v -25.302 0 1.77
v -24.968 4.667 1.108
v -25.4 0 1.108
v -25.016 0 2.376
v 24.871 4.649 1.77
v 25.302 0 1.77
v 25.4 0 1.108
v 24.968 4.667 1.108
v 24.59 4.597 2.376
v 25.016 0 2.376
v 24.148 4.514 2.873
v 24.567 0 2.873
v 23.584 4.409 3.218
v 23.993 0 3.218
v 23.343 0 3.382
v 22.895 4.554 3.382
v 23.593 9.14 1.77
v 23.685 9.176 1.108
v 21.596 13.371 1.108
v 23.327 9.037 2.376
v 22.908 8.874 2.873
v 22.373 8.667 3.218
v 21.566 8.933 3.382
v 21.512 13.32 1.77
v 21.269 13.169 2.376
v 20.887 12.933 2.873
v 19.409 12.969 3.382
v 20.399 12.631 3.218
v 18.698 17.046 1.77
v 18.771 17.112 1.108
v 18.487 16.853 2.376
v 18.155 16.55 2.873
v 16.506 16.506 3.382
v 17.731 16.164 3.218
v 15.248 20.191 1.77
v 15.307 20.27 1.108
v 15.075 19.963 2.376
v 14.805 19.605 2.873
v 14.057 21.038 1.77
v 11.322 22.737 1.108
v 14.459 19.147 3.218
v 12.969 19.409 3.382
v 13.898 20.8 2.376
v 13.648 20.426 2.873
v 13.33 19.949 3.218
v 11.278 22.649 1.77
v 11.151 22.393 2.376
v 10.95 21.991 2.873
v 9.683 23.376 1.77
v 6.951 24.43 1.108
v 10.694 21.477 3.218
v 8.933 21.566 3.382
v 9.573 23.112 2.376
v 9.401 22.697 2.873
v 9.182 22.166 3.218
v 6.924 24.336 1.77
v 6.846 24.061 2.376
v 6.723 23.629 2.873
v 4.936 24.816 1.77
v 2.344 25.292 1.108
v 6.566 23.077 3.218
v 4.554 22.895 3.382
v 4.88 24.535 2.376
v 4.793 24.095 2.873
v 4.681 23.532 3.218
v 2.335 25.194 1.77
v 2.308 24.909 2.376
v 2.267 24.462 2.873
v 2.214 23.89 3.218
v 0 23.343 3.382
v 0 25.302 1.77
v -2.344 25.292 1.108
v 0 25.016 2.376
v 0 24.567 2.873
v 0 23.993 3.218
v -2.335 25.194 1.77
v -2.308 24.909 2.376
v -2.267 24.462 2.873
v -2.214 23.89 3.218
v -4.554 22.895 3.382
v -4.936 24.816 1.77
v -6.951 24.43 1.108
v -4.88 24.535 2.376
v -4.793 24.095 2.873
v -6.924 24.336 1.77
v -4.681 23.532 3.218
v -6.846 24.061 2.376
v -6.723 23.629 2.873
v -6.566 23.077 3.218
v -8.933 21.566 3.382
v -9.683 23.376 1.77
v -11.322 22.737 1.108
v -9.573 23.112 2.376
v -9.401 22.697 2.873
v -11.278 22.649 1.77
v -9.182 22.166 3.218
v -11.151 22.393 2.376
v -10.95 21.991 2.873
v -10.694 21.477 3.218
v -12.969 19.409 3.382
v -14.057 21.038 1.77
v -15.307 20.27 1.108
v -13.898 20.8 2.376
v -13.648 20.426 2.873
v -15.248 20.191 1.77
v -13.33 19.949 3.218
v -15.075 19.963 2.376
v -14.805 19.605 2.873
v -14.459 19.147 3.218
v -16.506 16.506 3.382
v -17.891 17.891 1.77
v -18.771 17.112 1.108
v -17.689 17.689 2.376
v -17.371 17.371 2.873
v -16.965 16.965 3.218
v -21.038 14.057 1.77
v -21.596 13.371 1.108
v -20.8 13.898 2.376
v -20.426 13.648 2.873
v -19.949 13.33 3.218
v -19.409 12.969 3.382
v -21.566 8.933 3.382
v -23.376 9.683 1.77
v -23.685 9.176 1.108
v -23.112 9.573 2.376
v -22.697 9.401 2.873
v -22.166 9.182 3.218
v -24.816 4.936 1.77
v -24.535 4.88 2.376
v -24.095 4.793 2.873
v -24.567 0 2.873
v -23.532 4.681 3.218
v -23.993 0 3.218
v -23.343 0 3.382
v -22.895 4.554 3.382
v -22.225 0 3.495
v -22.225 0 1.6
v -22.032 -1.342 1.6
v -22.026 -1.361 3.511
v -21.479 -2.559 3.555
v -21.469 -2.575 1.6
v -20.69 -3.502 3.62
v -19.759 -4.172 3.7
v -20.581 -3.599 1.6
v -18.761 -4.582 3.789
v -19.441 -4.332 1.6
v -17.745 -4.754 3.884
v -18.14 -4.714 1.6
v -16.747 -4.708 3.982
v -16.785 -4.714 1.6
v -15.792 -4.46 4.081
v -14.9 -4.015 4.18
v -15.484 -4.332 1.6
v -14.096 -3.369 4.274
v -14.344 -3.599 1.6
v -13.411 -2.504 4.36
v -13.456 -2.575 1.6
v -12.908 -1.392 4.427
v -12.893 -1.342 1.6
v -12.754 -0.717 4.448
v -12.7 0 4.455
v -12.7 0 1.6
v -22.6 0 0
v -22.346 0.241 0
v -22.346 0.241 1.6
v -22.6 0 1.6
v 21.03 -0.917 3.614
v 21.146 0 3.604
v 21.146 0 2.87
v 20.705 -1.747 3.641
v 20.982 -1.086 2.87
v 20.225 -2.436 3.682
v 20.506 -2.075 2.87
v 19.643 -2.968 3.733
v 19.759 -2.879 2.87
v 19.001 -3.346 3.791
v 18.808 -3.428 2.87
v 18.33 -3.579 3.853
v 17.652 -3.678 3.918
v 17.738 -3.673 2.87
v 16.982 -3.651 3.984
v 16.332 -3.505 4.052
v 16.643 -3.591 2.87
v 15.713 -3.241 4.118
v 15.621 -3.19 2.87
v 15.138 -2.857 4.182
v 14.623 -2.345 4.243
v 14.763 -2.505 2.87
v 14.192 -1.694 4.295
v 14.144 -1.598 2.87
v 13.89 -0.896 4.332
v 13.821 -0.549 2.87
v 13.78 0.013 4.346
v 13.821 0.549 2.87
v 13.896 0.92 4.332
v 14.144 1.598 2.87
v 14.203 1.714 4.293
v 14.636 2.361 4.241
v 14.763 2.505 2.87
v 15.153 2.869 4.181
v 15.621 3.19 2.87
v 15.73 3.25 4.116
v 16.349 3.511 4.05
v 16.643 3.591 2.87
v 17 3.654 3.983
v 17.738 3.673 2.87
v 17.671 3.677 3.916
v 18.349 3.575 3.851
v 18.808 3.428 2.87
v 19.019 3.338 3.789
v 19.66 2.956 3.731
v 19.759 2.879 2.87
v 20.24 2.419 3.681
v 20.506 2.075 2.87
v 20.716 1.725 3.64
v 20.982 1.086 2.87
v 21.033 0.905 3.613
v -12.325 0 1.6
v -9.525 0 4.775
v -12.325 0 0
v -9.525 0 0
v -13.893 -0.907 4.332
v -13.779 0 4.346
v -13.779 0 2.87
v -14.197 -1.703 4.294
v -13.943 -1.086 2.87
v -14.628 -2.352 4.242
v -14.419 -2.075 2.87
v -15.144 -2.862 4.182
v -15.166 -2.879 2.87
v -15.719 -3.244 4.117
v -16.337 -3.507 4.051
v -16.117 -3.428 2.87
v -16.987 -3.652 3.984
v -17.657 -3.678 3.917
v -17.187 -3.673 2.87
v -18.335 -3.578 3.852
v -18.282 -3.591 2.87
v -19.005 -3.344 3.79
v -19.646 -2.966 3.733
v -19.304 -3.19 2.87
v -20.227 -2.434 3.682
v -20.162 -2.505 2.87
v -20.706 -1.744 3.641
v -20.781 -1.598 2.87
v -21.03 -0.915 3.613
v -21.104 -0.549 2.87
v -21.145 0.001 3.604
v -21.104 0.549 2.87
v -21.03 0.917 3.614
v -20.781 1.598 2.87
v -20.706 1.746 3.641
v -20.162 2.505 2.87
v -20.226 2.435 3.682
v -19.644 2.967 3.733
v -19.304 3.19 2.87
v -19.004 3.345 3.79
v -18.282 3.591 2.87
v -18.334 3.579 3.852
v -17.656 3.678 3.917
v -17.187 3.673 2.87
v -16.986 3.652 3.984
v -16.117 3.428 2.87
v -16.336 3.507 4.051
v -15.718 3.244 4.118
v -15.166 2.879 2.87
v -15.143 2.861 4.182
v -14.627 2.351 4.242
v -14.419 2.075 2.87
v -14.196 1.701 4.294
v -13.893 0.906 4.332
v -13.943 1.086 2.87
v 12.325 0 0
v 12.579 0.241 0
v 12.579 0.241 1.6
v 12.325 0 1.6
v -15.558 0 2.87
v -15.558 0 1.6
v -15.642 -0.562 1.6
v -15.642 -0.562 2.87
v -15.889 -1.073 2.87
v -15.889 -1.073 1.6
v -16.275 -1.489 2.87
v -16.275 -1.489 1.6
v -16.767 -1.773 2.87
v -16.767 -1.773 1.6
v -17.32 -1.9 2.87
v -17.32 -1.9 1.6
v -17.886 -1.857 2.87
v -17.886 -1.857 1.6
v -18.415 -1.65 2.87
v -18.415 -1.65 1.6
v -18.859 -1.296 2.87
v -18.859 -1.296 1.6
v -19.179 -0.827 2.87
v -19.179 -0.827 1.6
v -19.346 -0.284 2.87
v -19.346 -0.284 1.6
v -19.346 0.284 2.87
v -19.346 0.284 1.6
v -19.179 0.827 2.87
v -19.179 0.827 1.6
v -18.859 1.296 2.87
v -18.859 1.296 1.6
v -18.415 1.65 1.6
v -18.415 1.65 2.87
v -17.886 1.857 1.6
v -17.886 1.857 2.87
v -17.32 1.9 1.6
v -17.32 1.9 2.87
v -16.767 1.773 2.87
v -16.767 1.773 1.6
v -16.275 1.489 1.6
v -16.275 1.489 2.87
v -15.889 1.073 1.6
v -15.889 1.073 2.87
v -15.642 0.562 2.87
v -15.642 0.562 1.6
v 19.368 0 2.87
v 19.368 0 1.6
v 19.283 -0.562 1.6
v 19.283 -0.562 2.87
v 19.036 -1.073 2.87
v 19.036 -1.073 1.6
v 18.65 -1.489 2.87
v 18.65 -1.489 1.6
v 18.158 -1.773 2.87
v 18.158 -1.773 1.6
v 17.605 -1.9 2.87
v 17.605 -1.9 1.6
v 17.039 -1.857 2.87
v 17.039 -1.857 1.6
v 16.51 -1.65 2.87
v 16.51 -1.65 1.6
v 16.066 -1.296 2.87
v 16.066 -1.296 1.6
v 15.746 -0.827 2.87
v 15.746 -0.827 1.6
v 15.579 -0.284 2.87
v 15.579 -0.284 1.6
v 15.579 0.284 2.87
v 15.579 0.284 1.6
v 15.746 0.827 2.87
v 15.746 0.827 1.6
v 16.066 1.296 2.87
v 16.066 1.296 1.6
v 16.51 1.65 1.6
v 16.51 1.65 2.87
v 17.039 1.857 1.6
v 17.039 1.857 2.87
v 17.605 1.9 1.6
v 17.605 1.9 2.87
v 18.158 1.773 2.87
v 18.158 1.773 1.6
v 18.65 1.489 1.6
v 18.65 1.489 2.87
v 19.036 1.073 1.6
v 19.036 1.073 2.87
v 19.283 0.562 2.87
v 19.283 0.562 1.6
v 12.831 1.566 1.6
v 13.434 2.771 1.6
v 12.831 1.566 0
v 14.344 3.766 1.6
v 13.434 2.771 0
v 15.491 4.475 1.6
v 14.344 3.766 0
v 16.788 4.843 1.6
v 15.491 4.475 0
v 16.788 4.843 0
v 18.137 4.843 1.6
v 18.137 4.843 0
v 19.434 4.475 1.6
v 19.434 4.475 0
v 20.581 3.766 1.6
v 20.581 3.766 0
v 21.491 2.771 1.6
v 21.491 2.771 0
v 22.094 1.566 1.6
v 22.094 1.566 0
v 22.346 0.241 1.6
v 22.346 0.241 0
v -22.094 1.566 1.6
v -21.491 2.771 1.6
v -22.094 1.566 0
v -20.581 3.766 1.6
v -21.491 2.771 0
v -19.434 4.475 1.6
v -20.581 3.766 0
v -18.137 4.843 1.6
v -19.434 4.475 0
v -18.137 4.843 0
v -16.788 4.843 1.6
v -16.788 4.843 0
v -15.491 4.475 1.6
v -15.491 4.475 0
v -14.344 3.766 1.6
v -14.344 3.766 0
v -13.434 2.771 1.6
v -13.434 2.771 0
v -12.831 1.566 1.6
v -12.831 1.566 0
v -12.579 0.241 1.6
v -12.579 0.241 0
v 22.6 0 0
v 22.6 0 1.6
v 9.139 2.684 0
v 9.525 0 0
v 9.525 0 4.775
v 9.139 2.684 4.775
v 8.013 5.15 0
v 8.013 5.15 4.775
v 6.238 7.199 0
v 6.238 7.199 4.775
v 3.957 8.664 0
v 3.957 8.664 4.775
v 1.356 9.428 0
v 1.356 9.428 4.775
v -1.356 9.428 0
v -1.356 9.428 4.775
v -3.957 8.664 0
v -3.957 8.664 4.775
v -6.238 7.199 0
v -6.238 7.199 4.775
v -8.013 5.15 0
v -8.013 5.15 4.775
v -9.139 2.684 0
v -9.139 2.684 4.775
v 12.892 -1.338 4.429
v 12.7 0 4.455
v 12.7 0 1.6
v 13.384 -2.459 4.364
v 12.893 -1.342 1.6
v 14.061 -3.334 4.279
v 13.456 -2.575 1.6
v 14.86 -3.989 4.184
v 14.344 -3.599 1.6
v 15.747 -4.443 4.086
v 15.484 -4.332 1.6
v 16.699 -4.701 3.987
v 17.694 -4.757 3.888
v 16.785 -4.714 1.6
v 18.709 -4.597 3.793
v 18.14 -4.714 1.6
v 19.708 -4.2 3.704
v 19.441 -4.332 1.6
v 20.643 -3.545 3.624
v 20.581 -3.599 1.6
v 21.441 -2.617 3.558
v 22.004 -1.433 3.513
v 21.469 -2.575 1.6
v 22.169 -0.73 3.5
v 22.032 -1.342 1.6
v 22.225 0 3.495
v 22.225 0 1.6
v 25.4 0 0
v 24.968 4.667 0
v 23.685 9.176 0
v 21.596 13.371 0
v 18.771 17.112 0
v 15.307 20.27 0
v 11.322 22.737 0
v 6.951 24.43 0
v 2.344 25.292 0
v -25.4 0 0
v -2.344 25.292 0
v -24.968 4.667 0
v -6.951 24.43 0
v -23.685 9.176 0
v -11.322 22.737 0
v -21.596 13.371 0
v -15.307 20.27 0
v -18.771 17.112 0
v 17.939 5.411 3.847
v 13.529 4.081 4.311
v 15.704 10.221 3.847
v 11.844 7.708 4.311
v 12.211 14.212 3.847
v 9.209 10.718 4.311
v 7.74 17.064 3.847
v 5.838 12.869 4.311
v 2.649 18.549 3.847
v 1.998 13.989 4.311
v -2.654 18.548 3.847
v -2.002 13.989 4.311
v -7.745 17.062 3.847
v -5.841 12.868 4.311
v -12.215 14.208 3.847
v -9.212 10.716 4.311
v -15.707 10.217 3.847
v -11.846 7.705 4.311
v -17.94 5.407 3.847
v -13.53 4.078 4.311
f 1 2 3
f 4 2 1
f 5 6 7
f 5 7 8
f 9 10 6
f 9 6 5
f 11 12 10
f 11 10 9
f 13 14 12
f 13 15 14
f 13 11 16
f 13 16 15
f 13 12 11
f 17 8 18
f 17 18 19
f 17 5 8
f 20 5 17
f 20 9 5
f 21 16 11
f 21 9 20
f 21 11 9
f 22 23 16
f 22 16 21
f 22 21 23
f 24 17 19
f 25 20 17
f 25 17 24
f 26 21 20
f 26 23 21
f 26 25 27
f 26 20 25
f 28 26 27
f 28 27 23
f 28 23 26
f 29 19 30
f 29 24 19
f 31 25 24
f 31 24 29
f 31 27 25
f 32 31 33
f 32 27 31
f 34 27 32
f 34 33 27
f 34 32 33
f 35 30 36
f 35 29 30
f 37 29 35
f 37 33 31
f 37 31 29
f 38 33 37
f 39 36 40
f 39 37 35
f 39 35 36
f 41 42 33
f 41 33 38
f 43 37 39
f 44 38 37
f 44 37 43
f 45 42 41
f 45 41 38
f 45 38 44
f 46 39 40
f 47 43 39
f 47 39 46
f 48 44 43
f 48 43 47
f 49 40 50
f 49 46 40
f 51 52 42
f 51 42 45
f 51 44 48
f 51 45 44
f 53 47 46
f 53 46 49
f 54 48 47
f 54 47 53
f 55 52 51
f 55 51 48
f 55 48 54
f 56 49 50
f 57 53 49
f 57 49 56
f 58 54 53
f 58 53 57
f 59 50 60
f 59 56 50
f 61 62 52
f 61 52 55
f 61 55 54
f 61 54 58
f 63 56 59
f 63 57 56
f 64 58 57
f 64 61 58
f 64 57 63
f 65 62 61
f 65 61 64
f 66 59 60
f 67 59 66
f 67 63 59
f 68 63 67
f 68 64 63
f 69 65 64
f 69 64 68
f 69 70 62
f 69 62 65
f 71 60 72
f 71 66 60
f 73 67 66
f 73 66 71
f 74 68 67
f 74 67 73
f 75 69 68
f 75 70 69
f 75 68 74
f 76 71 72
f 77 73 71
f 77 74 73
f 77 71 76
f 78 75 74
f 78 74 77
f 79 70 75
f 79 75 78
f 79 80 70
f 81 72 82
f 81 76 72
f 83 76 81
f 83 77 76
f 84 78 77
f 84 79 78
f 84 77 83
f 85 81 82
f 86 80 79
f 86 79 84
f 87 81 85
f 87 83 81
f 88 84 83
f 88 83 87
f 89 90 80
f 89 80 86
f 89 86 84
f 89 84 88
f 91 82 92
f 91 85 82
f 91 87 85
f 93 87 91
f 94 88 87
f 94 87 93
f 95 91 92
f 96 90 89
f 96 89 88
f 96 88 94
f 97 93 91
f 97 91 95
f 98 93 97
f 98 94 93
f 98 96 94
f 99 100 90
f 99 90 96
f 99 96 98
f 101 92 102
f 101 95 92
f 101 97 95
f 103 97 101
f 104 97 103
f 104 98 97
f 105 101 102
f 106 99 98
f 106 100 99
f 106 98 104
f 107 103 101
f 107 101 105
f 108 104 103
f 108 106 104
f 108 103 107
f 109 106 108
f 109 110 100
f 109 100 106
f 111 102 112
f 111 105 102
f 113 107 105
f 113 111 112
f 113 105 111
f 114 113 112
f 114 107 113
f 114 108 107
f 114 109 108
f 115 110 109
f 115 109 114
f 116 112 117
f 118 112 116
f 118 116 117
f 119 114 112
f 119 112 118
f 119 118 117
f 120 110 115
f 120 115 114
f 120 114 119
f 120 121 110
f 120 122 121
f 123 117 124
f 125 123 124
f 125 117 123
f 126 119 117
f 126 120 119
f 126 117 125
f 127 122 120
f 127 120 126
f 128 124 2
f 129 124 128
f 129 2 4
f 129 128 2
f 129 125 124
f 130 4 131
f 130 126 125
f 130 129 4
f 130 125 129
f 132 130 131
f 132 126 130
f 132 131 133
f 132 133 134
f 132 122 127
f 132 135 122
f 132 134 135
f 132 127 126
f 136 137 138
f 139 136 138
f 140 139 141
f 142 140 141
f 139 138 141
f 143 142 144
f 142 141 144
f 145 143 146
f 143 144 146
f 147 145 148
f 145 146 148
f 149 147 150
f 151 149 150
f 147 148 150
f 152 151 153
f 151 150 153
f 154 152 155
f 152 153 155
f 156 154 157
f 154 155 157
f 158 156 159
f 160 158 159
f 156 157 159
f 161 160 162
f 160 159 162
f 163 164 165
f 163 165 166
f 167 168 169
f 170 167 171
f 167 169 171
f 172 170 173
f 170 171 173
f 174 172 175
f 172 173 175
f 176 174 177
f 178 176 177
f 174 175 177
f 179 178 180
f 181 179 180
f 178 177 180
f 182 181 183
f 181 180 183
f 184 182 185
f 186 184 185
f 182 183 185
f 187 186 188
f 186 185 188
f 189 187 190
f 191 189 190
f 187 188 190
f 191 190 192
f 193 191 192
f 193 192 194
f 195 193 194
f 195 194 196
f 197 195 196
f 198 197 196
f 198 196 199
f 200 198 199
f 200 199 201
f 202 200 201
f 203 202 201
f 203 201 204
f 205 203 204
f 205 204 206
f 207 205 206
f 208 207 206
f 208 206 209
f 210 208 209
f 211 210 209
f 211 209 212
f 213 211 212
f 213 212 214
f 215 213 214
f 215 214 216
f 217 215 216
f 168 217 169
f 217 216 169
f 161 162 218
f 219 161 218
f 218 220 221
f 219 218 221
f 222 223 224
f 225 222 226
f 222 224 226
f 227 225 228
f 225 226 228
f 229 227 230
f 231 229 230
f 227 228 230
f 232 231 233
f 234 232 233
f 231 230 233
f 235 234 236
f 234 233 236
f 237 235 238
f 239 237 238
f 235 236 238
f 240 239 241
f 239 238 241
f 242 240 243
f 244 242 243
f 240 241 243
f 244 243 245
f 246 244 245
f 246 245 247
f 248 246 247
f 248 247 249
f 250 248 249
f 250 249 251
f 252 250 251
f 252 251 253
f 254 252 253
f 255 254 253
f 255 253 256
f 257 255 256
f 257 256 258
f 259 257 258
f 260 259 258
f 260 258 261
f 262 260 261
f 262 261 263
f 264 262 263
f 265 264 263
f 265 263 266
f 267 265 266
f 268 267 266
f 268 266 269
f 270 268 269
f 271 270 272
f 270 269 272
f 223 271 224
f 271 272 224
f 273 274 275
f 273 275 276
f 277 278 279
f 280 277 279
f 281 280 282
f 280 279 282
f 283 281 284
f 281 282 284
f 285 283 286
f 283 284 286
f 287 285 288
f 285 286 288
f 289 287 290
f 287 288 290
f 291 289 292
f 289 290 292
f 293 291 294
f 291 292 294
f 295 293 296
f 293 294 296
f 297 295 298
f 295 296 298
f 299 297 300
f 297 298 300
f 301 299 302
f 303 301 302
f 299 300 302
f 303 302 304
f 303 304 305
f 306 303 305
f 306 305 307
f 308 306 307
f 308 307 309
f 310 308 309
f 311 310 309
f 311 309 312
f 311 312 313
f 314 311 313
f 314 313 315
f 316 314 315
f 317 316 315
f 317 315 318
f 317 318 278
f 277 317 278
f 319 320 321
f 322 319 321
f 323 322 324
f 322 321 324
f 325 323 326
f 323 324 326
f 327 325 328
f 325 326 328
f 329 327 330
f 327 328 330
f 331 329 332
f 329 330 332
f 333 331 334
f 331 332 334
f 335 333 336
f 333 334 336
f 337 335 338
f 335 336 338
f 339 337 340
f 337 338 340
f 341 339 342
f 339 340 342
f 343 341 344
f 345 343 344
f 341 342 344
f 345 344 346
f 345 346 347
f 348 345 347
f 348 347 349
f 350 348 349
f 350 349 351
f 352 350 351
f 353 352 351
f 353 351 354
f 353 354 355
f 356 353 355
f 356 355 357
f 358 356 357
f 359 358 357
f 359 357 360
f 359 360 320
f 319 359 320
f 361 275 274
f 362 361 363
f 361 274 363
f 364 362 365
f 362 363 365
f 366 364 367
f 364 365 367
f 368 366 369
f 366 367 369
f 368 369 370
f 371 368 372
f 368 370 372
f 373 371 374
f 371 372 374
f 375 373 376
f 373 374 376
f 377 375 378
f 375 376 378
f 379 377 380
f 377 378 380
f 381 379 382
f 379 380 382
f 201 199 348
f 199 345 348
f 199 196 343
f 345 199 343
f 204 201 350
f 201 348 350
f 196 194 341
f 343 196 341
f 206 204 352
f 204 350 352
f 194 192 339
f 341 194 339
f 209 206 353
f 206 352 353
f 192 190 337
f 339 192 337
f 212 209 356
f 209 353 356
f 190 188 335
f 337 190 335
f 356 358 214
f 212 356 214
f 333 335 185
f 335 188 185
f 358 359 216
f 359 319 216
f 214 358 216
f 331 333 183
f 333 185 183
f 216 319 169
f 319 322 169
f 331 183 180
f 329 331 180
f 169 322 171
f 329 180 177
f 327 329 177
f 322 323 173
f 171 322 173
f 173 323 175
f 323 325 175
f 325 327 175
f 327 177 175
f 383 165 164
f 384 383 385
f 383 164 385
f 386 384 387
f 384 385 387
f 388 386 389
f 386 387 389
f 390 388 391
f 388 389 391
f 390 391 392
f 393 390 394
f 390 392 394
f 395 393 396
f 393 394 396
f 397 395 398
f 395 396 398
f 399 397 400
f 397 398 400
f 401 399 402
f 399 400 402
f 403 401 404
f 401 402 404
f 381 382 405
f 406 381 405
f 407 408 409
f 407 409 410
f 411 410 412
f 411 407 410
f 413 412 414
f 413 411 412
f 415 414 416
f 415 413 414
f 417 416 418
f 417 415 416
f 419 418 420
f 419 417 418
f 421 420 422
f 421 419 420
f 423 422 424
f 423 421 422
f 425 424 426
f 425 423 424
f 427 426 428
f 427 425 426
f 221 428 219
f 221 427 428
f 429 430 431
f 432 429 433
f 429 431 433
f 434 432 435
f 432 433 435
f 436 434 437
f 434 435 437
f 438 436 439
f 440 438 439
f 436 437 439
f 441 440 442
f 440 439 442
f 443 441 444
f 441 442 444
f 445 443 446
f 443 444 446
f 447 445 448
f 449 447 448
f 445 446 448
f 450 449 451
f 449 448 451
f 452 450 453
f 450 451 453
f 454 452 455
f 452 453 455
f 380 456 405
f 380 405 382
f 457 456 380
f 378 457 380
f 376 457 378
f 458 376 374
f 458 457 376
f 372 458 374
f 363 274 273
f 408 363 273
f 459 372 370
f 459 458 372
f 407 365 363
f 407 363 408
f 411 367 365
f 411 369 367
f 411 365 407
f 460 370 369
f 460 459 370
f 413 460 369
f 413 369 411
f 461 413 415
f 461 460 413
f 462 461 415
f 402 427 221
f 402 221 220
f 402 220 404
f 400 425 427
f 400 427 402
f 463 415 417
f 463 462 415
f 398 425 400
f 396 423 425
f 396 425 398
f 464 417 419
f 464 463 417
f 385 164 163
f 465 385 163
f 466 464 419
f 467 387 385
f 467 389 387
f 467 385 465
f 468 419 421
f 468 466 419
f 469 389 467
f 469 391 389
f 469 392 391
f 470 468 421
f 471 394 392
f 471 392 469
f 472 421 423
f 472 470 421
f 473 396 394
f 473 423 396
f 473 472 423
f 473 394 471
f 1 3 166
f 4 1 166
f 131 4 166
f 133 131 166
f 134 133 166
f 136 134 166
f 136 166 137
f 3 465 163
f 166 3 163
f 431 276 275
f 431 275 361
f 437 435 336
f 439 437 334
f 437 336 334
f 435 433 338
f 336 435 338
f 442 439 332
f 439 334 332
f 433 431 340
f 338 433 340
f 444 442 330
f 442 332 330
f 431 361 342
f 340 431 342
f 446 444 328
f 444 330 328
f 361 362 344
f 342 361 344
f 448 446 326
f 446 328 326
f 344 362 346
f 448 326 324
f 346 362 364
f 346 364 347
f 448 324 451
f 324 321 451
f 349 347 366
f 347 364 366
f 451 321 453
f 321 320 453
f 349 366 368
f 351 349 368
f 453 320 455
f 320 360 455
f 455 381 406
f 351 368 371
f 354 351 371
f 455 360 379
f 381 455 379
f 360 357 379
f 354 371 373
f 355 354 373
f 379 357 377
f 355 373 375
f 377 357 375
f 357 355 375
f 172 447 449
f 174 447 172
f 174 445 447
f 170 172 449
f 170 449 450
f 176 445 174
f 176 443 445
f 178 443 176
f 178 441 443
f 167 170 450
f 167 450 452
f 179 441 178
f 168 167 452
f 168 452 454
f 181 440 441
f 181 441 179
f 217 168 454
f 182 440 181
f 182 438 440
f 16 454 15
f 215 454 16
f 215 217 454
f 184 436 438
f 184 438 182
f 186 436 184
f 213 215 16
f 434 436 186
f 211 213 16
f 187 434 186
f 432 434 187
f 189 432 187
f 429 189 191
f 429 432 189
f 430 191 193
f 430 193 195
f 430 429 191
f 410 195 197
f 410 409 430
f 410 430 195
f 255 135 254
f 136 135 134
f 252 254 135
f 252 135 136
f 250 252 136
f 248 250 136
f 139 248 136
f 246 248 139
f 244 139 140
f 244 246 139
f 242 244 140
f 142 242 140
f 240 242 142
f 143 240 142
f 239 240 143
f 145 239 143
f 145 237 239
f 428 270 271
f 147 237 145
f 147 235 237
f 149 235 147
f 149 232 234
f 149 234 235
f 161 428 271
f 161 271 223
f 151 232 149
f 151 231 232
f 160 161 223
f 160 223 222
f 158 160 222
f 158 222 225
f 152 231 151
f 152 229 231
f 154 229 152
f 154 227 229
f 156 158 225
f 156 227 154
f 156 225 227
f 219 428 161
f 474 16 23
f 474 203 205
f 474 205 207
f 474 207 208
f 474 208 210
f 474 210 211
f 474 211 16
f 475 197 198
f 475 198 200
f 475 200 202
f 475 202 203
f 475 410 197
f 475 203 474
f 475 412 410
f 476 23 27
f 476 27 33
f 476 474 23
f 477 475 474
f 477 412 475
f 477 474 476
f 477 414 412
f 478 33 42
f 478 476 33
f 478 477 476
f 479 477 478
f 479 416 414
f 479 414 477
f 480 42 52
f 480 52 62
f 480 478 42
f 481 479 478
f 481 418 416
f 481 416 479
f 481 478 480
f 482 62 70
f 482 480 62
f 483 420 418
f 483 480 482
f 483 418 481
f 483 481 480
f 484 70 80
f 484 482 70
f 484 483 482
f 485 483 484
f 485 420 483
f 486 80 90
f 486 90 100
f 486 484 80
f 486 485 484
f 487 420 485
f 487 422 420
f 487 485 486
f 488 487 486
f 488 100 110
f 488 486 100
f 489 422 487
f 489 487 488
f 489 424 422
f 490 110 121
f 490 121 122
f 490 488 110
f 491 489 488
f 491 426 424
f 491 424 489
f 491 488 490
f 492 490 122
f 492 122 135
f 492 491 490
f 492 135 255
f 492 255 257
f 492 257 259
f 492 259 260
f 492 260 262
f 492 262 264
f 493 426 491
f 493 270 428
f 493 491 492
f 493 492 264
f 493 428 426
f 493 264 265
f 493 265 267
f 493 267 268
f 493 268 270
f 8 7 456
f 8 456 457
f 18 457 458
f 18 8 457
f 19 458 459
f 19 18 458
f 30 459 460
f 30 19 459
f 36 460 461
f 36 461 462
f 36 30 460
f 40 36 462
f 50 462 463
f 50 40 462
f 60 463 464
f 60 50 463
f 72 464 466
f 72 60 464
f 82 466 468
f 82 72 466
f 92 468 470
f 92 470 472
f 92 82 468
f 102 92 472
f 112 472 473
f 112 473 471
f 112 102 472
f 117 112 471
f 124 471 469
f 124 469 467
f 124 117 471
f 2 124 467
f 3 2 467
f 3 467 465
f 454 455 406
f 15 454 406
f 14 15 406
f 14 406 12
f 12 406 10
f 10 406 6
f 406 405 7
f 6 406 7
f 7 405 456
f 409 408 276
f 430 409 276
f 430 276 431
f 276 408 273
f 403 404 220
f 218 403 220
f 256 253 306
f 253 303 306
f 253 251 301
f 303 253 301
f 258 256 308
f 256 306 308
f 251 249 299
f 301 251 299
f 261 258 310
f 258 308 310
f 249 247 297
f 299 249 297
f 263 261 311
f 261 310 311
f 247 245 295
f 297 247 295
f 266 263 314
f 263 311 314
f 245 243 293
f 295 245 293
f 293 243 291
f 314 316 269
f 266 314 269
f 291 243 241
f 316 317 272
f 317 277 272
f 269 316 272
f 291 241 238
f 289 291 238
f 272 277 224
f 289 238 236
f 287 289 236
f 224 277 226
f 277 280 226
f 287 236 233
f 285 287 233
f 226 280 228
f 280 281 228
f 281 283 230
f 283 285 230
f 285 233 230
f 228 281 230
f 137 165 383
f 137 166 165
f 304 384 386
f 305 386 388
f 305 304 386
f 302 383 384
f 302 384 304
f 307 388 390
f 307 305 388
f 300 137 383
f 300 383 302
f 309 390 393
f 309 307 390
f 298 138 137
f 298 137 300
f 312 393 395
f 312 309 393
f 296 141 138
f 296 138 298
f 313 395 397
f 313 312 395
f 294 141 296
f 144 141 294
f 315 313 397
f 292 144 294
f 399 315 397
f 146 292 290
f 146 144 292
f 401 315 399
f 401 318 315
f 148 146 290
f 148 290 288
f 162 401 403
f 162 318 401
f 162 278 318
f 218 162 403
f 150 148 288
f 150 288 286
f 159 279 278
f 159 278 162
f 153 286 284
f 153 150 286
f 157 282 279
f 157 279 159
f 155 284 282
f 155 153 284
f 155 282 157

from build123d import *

# Parameters (mm, degrees)
F3_DEPTH     = 4.7762
F4_R         = 4.8895
F5_DEPTH     = 1.6002
F6_R         = 1.905
F7_DEPTH     = 3.1760001
F9_R         = 3.683
F10_DEPTH    = 1.9060001
F11_T1_DEPTH = 2.2381504403


# Not quite as in the source:
# - a fillet or chamfer that OpenCascade refuses, or shapes differently, is made with other operations: its cross-section is extruded or revolved along the edge and cut away or added


with BuildPart() as f1:
    # F0 (on Front) → F1 (revolve)
    with BuildSketch(Plane.XZ):
        with BuildLine():
            Line((9.525, 4.7752), (9.525, 0))
            Line((9.525, 0), (25.4, 0))
            Line((25.4, 0), (25.4, 1.10784454))
            ThreePointArc((25.4, 1.10784454), (24.8095678029, 2.6410913648), (23.343266994, 3.382318687))
            Line((23.343266994, 3.382318687), (9.525, 4.7752))
        make_face()
    revolve(axis=Axis((0, 0, 2.1961550228), (0, 0, 1)))

    # F2 (on face) → F3 (cut, through all)
    with BuildSketch(Plane(origin=(0, 0, 0), x_dir=(1, 0, 0), z_dir=(0, 0, -1))):
        with BuildLine():
            Line((-25.4, 25.4), (-25.4, 0))
            Line((-25.4, 0), (-22.225, 0))
            ThreePointArc((-22.225, 0), (-17.4625, 4.7625), (-12.7, 0))
            Line((-12.7, 0), (-9.525, 0))
            ThreePointArc((-9.525, 0), (0, 9.525), (9.525, 0))
            Line((9.525, 0), (12.7, 0))
            ThreePointArc((12.7, 0), (17.4625, 4.7625), (22.225, 0))
            Line((22.225, 0), (25.4, 0))
            Line((25.4, 0), (25.4, 25.4))
            Line((25.4, 25.4), (-25.4, 25.4))
        make_face()
        with BuildLine():
            ThreePointArc((9.525, 0), (0, 9.525), (-9.525, 0))
            ThreePointArc((-9.525, 0), (0, -9.525), (9.525, 0))
        make_face()
    extrude(amount=-F3_DEPTH, mode=Mode.SUBTRACT)

    # F4 (on face) → F5 (cut)
    with BuildSketch(Plane(origin=(0, 0, 0), x_dir=(1, 0, 0), z_dir=(0, 0, -1))):
        with Locations((-17.4625, 0)):
            Circle(F4_R)
        with Locations((17.4625, 0)):
            Circle(F4_R)
    extrude(amount=-F5_DEPTH, mode=Mode.SUBTRACT)

    # F6 (on face) → F7 (cut, through all)
    with BuildSketch(Plane(origin=(0, 0, 1.6002), x_dir=(1, 0, 0), z_dir=(0, 0, -1))):
        with Locations((-17.4625, 0)):
            Circle(F6_R)
        with Locations((17.4625, 0)):
            Circle(F6_R)
    extrude(amount=-F7_DEPTH, mode=Mode.SUBTRACT)

    # F9 (on offset) → F10 (cut, through all)
    with BuildSketch(Plane(origin=(0, 0, 2.8702), x_dir=(1, 0, 0), z_dir=(0, 0, -1))):
        with Locations((17.4625, 0)):
            Circle(F9_R)
        with Locations((-17.4625, 0)):
            Circle(F9_R)
    extrude(amount=-F10_DEPTH, mode=Mode.SUBTRACT)

    # F11: chamfer of 0.254 on 4 edges, made by hand

    # F11_s2 → F11_t1 (cut)
    with BuildSketch(Plane.XY.offset(-0.6379504403)):
        with BuildLine():
            Line((-22.3460344648, 0.2414567901), (-22.5997245668, 0))
            Line((-22.5997245668, 0), (-22.352, 0))
            ThreePointArc((-22.352, 0), (-22.3504182536, 0.1243599467), (-22.3460344648, 0.2414567901))
        make_face()
        with BuildLine():
            Line((-12.5789655352, 0.2414567901), (-12.3252754332, 0))
            Line((-12.3252754332, 0), (-12.573, 0))
            ThreePointArc((-12.573, 0), (-12.5745817464, 0.1243599467), (-12.5789655352, 0.2414567901))
        make_face()
        with BuildLine():
            Line((12.5789655352, 0.2414567901), (12.3252754332, 0))
            Line((12.3252754332, 0), (12.573, 0))
            ThreePointArc((12.573, 0), (12.5745817464, 0.1243599467), (12.5789655352, 0.2414567901))
        make_face()
        with BuildLine():
            Line((22.3460344648, 0.2414567901), (22.5997245668, 0))
            Line((22.5997245668, 0), (22.352, 0))
            ThreePointArc((22.352, 0), (22.3504182536, 0.1243599467), (22.3460344648, 0.2414567901))
        make_face()
    extrude(amount=F11_T1_DEPTH, mode=Mode.SUBTRACT)


solid = f1.part
